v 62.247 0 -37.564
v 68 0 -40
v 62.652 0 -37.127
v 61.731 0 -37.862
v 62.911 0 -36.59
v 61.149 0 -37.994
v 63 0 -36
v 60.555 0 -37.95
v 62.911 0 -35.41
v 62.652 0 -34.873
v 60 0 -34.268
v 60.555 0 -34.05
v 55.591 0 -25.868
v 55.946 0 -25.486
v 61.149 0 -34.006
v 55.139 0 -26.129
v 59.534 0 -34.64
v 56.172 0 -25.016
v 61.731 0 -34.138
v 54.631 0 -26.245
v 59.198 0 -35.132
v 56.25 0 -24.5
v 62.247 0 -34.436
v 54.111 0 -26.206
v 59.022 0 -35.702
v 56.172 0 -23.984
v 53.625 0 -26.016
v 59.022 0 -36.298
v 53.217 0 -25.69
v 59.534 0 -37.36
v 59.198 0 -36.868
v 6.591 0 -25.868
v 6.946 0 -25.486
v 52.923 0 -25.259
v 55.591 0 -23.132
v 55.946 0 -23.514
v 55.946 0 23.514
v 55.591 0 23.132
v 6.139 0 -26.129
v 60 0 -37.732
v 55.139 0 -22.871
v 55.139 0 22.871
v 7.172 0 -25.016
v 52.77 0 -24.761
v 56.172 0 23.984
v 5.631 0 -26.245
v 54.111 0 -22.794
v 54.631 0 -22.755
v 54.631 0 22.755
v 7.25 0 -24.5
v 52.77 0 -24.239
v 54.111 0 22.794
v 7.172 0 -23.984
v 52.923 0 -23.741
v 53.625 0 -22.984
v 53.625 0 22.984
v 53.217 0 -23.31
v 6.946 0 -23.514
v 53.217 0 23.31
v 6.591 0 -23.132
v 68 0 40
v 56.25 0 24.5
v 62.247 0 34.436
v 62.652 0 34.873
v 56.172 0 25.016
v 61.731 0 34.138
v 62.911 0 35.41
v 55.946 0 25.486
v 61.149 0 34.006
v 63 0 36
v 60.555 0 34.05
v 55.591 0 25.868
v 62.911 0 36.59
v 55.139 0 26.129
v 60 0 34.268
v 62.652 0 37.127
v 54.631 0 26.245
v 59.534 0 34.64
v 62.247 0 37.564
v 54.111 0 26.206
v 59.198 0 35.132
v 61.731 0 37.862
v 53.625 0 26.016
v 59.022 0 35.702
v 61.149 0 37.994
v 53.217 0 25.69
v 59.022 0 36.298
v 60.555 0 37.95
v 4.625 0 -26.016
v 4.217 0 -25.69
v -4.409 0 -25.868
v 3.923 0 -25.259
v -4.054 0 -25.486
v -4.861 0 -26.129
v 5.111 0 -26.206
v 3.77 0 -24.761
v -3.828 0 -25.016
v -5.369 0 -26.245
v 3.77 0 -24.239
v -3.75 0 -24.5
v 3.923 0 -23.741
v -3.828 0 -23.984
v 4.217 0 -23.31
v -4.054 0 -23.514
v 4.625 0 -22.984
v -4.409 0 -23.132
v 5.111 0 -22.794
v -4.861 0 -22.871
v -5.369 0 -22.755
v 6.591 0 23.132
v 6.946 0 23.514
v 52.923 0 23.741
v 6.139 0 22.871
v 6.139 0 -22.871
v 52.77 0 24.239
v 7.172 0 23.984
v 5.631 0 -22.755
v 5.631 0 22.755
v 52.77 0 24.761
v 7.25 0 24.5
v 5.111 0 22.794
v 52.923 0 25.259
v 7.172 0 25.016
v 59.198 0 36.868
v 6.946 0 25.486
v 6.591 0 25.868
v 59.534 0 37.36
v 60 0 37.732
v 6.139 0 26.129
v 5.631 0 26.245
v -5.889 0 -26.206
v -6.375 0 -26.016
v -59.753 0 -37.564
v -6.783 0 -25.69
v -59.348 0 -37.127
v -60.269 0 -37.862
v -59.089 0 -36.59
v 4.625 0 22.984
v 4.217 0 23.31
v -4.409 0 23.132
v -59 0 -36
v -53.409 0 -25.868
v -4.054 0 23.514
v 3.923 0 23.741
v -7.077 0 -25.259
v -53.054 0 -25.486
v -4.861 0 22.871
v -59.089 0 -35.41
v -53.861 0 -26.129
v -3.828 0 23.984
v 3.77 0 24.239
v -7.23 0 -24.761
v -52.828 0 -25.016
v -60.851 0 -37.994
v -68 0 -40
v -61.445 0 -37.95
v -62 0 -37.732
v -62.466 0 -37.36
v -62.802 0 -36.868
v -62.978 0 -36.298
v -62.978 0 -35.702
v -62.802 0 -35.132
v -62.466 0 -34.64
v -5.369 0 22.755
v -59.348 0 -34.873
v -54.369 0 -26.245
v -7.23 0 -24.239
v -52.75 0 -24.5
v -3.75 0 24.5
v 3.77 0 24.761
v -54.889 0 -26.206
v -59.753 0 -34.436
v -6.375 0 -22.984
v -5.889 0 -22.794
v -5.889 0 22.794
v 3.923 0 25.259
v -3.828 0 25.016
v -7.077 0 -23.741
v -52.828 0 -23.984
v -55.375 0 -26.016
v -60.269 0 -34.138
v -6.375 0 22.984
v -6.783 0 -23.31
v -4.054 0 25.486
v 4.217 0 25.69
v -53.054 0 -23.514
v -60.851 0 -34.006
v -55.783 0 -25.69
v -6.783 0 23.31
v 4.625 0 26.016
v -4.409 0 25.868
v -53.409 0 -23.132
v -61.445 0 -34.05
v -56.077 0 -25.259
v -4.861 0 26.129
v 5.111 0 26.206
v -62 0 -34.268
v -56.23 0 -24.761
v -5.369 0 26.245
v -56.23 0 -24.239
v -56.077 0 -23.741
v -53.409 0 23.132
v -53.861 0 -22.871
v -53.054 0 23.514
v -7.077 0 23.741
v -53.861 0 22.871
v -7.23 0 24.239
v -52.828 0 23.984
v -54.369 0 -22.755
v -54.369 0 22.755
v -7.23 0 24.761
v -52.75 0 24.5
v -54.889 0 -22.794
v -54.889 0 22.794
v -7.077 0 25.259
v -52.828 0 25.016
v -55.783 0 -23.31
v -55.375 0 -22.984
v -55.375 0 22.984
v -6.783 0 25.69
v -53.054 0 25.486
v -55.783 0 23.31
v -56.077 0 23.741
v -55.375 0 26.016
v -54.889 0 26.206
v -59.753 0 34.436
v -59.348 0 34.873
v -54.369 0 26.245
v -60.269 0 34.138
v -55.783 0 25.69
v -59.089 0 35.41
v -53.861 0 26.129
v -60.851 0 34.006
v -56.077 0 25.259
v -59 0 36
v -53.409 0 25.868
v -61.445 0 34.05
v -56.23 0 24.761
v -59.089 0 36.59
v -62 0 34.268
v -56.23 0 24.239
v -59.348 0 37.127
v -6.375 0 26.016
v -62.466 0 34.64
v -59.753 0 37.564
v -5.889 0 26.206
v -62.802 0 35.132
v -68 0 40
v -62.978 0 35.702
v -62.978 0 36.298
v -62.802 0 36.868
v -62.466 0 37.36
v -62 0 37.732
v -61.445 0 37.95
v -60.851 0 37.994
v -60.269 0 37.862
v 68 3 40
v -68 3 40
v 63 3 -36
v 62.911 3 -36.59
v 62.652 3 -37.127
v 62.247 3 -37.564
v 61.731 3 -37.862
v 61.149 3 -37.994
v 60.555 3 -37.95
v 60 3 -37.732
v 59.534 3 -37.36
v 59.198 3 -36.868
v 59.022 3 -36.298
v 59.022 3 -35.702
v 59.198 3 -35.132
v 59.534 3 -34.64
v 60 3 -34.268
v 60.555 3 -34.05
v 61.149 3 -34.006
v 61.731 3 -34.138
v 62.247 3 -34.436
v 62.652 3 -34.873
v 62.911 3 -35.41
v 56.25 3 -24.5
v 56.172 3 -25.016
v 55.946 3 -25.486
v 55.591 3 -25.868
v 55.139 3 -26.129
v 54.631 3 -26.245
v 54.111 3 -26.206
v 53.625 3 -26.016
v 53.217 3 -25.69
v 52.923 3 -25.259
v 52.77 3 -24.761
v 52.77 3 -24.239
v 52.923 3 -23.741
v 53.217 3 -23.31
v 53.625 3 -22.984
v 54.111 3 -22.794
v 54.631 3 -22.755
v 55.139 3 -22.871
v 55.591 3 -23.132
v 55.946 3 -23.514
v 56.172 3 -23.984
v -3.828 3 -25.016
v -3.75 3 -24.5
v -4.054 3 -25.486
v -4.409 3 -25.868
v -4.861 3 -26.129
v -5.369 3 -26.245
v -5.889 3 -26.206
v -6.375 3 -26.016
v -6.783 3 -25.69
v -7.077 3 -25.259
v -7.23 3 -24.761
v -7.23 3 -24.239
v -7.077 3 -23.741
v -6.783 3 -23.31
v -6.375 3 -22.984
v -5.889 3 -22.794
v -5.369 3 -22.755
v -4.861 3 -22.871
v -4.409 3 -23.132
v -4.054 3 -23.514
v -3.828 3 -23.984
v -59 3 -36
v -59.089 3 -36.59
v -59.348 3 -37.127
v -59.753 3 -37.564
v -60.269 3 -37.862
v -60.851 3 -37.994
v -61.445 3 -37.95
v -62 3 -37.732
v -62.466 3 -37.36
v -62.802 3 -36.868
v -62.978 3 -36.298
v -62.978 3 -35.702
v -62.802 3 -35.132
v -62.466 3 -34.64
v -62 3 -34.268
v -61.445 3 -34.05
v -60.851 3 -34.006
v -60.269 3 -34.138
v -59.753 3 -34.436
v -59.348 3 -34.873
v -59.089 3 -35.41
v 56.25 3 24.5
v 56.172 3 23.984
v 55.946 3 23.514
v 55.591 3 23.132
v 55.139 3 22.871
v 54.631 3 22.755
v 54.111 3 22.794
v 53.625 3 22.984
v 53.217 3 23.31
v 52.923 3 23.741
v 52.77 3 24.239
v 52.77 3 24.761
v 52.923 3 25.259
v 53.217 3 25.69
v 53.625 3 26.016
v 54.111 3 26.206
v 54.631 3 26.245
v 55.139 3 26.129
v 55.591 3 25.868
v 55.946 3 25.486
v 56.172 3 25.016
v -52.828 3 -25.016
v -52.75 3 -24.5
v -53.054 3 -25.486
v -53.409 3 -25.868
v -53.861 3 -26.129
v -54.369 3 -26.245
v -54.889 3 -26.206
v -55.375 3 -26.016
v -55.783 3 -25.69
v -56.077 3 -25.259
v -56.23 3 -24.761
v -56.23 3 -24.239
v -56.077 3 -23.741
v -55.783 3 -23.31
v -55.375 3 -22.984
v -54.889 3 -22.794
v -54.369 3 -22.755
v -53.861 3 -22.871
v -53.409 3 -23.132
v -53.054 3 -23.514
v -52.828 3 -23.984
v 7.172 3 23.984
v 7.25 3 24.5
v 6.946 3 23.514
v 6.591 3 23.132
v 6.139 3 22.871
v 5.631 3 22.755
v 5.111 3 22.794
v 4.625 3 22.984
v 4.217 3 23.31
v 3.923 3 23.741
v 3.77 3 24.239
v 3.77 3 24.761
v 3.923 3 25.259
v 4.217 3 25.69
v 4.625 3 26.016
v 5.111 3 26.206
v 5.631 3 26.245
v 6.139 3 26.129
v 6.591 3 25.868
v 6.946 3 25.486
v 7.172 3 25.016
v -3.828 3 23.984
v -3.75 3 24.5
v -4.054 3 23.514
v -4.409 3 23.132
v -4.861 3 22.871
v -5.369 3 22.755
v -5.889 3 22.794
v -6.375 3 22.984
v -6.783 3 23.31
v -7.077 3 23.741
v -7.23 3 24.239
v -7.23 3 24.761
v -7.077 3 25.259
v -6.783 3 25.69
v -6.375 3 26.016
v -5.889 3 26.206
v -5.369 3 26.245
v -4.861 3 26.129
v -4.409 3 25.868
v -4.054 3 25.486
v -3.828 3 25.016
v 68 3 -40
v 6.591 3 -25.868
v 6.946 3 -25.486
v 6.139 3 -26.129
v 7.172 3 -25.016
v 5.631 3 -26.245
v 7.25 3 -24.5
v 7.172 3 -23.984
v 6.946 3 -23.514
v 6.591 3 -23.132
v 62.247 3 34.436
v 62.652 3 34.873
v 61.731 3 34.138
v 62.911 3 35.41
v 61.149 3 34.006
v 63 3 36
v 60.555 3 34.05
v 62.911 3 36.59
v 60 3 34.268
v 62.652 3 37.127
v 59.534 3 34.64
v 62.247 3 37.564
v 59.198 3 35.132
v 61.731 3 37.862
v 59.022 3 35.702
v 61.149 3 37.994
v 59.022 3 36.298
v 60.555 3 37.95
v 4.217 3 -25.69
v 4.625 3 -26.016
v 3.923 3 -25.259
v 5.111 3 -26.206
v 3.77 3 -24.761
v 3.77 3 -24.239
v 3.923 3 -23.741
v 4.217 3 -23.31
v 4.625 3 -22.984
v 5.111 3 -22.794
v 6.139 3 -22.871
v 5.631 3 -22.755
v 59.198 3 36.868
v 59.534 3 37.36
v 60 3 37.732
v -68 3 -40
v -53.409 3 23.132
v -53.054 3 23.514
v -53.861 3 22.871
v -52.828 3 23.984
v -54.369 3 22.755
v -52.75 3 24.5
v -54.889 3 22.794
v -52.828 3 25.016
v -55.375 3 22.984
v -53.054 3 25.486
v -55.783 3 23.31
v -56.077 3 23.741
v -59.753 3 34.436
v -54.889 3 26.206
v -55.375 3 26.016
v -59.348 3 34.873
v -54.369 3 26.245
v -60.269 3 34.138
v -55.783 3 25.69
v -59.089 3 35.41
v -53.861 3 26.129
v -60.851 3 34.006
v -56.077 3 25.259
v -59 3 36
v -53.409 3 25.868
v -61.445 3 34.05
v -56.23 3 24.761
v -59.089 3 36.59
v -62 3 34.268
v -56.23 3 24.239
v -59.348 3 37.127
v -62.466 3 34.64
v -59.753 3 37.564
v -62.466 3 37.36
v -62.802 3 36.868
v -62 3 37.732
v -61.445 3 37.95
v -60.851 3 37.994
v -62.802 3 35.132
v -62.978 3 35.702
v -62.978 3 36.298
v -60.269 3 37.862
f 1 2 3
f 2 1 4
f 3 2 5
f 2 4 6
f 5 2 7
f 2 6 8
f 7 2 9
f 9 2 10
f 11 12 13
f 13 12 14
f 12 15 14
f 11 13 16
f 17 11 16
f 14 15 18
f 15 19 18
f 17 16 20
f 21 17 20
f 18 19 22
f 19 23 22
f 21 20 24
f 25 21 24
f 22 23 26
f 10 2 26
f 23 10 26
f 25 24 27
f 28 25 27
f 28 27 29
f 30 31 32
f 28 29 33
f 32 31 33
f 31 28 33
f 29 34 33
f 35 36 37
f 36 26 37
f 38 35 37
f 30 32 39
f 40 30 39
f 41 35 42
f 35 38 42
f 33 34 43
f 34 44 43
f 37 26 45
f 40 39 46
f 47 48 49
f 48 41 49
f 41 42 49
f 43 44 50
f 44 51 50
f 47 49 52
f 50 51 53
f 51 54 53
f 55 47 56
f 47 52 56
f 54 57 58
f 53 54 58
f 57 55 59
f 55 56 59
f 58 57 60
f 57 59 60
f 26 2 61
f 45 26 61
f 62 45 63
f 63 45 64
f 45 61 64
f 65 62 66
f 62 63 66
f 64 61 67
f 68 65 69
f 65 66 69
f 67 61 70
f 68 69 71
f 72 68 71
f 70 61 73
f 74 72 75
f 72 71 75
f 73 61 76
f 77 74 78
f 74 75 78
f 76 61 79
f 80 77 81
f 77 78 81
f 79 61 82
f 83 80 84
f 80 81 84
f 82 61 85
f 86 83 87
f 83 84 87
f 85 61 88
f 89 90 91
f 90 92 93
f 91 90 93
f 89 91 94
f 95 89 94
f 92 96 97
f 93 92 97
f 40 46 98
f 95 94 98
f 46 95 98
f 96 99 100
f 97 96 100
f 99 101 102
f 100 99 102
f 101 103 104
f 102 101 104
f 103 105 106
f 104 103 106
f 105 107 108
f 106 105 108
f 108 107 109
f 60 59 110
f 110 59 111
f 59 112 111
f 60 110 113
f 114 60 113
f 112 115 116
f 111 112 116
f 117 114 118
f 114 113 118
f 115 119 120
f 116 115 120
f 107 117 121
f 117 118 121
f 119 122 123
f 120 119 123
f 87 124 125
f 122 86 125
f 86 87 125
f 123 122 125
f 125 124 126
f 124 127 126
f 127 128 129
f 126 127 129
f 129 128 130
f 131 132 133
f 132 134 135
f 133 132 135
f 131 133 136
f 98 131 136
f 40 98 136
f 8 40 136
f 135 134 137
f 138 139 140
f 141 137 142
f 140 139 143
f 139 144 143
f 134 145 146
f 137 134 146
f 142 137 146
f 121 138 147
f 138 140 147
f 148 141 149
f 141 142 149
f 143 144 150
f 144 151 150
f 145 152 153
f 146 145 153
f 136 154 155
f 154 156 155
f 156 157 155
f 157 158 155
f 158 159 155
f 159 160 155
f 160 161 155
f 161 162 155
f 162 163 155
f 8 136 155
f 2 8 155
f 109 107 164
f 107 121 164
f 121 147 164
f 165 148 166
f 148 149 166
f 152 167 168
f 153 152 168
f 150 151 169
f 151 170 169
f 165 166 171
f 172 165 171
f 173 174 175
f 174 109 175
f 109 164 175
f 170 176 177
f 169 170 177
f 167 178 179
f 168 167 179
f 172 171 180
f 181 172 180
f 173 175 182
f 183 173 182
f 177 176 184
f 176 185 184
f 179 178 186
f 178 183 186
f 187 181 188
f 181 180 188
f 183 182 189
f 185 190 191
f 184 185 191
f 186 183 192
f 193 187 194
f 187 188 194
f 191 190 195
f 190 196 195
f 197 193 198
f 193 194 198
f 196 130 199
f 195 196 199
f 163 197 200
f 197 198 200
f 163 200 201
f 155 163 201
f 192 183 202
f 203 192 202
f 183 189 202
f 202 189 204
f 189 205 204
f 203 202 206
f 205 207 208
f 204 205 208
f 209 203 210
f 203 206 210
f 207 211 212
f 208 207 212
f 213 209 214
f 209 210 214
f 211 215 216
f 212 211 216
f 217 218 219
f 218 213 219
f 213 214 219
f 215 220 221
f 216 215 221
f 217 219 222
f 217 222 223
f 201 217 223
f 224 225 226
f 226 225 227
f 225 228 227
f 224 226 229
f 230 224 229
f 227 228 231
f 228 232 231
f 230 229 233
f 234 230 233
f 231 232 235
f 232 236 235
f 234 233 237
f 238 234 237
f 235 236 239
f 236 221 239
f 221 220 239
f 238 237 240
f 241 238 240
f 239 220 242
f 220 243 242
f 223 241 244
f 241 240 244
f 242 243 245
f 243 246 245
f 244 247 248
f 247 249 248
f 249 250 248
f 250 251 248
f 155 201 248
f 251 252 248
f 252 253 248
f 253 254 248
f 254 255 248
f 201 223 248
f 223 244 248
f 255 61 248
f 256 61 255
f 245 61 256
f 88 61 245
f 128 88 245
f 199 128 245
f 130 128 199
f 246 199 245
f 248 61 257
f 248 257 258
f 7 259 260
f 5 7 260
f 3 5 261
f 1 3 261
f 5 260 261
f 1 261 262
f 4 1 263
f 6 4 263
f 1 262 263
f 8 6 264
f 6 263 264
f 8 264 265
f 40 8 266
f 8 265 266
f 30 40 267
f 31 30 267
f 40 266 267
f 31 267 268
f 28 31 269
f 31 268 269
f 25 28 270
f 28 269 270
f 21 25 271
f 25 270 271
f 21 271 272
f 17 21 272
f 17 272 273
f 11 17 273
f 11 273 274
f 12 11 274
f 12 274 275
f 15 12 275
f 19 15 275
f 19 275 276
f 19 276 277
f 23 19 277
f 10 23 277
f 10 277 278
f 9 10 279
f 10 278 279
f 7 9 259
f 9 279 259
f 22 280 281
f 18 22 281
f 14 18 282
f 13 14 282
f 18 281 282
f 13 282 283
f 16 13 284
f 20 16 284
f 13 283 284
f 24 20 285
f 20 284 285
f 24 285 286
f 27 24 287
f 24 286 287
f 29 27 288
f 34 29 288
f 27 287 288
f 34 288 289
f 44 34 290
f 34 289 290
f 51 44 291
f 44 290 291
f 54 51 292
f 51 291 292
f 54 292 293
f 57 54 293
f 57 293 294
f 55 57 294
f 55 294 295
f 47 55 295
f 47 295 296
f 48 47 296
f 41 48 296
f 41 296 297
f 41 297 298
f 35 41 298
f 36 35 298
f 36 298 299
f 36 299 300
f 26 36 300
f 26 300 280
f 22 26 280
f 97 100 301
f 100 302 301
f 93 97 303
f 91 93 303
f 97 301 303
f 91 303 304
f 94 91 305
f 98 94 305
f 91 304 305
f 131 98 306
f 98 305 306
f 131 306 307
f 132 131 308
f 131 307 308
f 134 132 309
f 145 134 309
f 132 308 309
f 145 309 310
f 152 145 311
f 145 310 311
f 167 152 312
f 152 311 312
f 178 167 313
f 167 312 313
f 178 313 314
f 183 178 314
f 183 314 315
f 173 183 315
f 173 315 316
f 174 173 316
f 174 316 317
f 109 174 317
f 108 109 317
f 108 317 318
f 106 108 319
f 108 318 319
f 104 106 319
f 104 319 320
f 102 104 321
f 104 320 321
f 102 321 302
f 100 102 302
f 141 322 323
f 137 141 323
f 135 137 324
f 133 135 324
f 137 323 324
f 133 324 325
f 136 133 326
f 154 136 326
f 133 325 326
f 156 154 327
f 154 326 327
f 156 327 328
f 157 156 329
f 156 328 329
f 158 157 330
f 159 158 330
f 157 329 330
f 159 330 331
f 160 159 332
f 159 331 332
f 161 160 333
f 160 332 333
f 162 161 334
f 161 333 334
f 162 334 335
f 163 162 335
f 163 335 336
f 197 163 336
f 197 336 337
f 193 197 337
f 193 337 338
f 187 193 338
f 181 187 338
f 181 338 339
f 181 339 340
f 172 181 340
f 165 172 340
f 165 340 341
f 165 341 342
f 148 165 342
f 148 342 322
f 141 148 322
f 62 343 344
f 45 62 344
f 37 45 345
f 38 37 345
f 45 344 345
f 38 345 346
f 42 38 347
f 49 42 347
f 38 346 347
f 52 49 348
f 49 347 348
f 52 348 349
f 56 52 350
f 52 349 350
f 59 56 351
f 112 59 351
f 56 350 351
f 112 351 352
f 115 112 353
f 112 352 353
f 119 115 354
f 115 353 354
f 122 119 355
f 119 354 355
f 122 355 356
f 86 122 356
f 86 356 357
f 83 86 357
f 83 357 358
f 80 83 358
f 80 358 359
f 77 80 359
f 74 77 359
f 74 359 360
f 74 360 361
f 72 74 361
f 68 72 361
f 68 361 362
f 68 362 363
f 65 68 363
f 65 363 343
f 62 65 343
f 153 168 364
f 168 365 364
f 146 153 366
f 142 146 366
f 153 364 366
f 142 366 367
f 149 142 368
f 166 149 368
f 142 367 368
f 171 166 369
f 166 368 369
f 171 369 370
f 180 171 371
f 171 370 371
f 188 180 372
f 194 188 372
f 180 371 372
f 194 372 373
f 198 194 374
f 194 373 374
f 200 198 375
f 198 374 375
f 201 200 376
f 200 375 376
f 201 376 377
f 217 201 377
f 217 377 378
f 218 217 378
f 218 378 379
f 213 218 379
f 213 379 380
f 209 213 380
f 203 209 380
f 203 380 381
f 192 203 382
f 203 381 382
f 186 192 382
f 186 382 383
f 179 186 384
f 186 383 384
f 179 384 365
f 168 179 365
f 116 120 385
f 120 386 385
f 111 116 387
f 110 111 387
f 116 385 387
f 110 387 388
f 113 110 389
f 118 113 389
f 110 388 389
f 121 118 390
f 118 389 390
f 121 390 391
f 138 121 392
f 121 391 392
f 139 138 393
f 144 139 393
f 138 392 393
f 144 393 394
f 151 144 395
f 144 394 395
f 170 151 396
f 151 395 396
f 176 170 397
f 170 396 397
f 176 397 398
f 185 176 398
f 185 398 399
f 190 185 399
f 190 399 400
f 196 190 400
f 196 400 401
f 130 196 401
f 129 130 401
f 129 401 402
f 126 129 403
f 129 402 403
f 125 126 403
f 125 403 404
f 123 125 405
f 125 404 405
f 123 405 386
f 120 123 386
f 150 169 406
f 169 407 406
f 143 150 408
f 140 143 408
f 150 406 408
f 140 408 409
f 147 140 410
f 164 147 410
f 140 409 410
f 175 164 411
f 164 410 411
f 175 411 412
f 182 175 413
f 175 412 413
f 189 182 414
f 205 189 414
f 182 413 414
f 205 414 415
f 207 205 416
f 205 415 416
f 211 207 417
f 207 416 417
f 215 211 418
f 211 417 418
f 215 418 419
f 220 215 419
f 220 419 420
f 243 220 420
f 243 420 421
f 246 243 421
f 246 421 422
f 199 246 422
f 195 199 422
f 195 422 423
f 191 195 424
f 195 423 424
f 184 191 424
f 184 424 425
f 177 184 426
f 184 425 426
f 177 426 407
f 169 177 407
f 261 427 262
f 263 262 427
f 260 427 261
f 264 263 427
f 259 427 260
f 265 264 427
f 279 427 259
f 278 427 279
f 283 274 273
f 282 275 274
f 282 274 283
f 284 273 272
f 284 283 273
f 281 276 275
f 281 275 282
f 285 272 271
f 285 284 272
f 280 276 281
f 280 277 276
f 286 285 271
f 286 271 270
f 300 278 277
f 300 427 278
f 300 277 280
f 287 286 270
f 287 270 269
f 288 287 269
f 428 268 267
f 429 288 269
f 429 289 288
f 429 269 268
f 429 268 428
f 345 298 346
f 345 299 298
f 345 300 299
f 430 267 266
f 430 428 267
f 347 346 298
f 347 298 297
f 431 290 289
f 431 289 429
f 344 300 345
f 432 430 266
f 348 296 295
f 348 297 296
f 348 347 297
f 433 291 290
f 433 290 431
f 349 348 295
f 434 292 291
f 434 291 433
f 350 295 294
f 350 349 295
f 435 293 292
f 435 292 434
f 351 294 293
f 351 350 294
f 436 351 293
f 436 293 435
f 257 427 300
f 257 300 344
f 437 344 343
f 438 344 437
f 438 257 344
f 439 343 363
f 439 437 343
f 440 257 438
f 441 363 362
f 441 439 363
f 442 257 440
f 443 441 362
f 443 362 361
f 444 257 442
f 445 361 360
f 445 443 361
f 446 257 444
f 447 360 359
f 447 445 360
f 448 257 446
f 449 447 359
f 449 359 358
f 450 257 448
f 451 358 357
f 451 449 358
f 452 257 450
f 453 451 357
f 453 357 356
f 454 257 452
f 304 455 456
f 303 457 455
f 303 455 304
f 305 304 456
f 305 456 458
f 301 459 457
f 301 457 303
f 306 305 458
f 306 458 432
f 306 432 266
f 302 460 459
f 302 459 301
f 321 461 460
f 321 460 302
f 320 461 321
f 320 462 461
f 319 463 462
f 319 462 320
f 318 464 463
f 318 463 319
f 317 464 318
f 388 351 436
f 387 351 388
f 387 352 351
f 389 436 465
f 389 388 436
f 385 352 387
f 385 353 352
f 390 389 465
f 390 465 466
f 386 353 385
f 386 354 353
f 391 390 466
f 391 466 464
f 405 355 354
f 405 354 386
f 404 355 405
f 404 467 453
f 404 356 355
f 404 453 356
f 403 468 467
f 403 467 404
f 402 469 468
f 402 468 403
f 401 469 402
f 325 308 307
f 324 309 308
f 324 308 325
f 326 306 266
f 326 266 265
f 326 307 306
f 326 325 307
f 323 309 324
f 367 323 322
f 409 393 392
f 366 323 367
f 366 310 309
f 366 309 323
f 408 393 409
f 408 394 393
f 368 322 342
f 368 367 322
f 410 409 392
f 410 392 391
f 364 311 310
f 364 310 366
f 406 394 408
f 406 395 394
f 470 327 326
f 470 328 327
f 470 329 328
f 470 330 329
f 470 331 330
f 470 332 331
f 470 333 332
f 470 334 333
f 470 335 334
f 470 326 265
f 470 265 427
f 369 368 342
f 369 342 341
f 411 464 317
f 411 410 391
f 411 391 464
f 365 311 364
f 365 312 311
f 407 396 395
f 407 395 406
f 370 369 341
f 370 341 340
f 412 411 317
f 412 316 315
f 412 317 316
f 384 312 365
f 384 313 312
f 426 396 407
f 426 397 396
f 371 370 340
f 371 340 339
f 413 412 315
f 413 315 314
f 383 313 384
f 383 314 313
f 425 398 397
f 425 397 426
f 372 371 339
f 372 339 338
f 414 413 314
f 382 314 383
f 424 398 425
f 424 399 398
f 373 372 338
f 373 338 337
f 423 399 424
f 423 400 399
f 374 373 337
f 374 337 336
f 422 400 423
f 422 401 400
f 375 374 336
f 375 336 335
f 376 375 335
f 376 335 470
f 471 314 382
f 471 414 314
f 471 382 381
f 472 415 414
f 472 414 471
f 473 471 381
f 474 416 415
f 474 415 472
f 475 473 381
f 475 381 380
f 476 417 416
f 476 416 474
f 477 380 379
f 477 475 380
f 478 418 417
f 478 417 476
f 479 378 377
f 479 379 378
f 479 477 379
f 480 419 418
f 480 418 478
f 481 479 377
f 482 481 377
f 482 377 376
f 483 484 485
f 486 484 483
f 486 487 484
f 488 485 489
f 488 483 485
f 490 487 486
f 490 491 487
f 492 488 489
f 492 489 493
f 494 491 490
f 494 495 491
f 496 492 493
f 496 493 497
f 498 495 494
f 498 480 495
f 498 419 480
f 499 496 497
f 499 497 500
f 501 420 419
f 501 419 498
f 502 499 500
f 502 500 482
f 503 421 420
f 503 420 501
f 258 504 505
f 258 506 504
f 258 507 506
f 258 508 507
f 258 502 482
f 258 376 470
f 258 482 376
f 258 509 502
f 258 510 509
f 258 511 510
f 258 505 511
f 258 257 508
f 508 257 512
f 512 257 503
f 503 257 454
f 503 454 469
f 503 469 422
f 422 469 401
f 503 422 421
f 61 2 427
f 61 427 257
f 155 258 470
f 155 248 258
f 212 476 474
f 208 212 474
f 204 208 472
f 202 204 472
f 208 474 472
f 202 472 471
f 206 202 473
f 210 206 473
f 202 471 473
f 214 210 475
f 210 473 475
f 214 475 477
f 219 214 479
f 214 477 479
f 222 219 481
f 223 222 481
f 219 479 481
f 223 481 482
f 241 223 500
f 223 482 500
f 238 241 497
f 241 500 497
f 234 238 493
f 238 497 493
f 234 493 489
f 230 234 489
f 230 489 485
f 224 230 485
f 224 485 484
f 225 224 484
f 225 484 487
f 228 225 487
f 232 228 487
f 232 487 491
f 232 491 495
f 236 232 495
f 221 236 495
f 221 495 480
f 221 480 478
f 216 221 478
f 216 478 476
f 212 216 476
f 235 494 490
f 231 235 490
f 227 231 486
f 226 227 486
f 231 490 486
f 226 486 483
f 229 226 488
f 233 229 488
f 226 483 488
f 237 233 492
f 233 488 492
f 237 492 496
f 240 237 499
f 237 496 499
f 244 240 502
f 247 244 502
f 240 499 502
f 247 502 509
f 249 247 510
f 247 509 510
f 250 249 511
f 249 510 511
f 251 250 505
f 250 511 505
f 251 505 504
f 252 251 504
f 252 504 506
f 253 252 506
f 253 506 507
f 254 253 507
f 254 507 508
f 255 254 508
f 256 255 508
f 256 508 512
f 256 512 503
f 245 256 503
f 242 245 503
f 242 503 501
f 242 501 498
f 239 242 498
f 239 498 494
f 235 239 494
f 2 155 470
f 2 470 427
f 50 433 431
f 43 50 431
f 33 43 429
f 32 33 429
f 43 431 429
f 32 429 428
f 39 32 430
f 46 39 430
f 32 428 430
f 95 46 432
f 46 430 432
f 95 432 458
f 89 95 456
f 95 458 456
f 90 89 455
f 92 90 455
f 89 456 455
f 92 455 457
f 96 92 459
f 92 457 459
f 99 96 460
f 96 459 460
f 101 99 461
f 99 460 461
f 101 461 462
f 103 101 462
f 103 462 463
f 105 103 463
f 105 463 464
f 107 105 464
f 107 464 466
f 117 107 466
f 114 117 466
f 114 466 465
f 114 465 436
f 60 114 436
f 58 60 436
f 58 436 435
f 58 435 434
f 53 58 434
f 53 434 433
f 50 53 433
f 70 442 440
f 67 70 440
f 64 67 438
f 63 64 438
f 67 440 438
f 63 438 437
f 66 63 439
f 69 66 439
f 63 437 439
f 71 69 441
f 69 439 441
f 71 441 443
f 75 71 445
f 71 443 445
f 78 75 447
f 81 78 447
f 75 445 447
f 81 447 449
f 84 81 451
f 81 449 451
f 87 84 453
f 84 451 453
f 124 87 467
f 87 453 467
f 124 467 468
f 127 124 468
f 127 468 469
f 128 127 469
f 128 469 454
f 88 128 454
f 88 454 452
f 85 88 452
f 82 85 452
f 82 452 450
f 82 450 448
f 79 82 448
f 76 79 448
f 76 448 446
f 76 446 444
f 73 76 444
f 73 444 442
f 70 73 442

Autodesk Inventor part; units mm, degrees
ref_plane "YZ Plane" through (0, 0, 0) normal (1, 0, 0) x (0, 1, 0)
ref_plane "XZ Plane" through (0, 0, 0) normal (0, 1, 0) x (-1, 0, 0)
ref_plane "XY Plane" through (0, 0, 0) normal (0, 0, 1) x (1, 0, 0)
sketch "스케치1" plane through (0, 0, 0) normal (0, 1, 0) x (-1, 0, 0)
  line L0 (-68, 40) -> (68, 40)
  line L1 (68, 40) -> (68, -40)
  line L2 (68, -40) -> (-68, -40)
  line L3 (-68, -40) -> (-68, 40)
  line L4 (-68, 40) -> (68, -40) construction
  line L5 (68, 40) -> (-68, -40) construction
  point P0 (0, 0)
  dimension "d0" = 136
  dimension "d1" = 80
extrude "돌출1" add sketch "스케치1" along normal blind 3
sketch "스케치2" plane through (0, 3, 0) normal (0, 1, 0) x (1, 0, 0)
  circle A0 centre (-54.5, 24.5) radius 1.75
  circle A1 centre (-5.5, 24.5) radius 1.75
  circle A2 centre (5.5, 24.5) radius 1.75
  circle A3 centre (54.5, 24.5) radius 1.75
  circle A4 centre (54.5, -24.5) radius 1.75
  circle A5 centre (5.5, -24.5) radius 1.75
  circle A6 centre (-5.5, -24.5) radius 1.75
  circle A7 centre (-54.5, -24.5) radius 1.75
  circle A8 centre (-61, 36) radius 2
  line L0 (-65, 32) -> (-57, 32)
  line L1 (-57, 32) -> (-57, 40)
  line L2 (-57, 40) -> (-65, 40)
  line L3 (-65, 40) -> (-65, 32)
  line L4 (-65, 32) -> (-57, 40) construction
  line L5 (-57, 32) -> (-65, 40) construction
  line L6 (68, 40) -> (-68, 40) projected
  line L7 (-68, 40) -> (-68, -40) projected
  line L8 (-1.8724, 0) -> (2.8404, 0)
  line L9 (0, 1.8083) -> (0, -2.4649)
  circle A9 centre (61, 36) radius 2
  circle A10 centre (-61, -36) radius 2
  circle A11 centre (61, -36) radius 2
  line L10 (68, -40) -> (68, 40) projected
  line L11 (-68, -40) -> (68, -40) projected
  dimension "d13" = 3.5
  dimension "d14" = 3.5
  dimension "d15" = 3.5
  dimension "d16" = 3.5
  dimension "d17" = 3.5
  dimension "d18" = 3.5
  dimension "d19" = 3.5
  dimension "d20" = 3.5
  dimension "d21" = 4
  dimension "d22" = 8
  dimension "d23" = 4
  dimension "d24" = 8
  dimension "d25" = 7
  dimension "d26" = 13.5
  dimension "d27" = 13.5
  dimension "d28" = 13.5
  dimension "d29" = 13.5
  dimension "d30" = 0
  dimension "d31" = 0
  dimension "d32" = 0
  dimension "d33" = 0
  dimension "d34" = 0
  dimension "d35" = 0
  dimension "d36" = 0
  dimension "d37" = 0
  dimension "d38" = 49
  dimension "d39" = 11
  dimension "d40" = 49
  dimension "d41" = 15.5
extrude "돌출2" cut sketch "스케치2" against normal blind 3 contours A0 | A1 | A2 | A3 | A4 | A5 | A6 | A7 | A8 | A9 | A10 | A11
equation "\"d27\" = d26"
equation "\"d28\" = d26"
equation "\"d29\" = d26"
properties part number "라즈베리파이 보관소 2층 판"
